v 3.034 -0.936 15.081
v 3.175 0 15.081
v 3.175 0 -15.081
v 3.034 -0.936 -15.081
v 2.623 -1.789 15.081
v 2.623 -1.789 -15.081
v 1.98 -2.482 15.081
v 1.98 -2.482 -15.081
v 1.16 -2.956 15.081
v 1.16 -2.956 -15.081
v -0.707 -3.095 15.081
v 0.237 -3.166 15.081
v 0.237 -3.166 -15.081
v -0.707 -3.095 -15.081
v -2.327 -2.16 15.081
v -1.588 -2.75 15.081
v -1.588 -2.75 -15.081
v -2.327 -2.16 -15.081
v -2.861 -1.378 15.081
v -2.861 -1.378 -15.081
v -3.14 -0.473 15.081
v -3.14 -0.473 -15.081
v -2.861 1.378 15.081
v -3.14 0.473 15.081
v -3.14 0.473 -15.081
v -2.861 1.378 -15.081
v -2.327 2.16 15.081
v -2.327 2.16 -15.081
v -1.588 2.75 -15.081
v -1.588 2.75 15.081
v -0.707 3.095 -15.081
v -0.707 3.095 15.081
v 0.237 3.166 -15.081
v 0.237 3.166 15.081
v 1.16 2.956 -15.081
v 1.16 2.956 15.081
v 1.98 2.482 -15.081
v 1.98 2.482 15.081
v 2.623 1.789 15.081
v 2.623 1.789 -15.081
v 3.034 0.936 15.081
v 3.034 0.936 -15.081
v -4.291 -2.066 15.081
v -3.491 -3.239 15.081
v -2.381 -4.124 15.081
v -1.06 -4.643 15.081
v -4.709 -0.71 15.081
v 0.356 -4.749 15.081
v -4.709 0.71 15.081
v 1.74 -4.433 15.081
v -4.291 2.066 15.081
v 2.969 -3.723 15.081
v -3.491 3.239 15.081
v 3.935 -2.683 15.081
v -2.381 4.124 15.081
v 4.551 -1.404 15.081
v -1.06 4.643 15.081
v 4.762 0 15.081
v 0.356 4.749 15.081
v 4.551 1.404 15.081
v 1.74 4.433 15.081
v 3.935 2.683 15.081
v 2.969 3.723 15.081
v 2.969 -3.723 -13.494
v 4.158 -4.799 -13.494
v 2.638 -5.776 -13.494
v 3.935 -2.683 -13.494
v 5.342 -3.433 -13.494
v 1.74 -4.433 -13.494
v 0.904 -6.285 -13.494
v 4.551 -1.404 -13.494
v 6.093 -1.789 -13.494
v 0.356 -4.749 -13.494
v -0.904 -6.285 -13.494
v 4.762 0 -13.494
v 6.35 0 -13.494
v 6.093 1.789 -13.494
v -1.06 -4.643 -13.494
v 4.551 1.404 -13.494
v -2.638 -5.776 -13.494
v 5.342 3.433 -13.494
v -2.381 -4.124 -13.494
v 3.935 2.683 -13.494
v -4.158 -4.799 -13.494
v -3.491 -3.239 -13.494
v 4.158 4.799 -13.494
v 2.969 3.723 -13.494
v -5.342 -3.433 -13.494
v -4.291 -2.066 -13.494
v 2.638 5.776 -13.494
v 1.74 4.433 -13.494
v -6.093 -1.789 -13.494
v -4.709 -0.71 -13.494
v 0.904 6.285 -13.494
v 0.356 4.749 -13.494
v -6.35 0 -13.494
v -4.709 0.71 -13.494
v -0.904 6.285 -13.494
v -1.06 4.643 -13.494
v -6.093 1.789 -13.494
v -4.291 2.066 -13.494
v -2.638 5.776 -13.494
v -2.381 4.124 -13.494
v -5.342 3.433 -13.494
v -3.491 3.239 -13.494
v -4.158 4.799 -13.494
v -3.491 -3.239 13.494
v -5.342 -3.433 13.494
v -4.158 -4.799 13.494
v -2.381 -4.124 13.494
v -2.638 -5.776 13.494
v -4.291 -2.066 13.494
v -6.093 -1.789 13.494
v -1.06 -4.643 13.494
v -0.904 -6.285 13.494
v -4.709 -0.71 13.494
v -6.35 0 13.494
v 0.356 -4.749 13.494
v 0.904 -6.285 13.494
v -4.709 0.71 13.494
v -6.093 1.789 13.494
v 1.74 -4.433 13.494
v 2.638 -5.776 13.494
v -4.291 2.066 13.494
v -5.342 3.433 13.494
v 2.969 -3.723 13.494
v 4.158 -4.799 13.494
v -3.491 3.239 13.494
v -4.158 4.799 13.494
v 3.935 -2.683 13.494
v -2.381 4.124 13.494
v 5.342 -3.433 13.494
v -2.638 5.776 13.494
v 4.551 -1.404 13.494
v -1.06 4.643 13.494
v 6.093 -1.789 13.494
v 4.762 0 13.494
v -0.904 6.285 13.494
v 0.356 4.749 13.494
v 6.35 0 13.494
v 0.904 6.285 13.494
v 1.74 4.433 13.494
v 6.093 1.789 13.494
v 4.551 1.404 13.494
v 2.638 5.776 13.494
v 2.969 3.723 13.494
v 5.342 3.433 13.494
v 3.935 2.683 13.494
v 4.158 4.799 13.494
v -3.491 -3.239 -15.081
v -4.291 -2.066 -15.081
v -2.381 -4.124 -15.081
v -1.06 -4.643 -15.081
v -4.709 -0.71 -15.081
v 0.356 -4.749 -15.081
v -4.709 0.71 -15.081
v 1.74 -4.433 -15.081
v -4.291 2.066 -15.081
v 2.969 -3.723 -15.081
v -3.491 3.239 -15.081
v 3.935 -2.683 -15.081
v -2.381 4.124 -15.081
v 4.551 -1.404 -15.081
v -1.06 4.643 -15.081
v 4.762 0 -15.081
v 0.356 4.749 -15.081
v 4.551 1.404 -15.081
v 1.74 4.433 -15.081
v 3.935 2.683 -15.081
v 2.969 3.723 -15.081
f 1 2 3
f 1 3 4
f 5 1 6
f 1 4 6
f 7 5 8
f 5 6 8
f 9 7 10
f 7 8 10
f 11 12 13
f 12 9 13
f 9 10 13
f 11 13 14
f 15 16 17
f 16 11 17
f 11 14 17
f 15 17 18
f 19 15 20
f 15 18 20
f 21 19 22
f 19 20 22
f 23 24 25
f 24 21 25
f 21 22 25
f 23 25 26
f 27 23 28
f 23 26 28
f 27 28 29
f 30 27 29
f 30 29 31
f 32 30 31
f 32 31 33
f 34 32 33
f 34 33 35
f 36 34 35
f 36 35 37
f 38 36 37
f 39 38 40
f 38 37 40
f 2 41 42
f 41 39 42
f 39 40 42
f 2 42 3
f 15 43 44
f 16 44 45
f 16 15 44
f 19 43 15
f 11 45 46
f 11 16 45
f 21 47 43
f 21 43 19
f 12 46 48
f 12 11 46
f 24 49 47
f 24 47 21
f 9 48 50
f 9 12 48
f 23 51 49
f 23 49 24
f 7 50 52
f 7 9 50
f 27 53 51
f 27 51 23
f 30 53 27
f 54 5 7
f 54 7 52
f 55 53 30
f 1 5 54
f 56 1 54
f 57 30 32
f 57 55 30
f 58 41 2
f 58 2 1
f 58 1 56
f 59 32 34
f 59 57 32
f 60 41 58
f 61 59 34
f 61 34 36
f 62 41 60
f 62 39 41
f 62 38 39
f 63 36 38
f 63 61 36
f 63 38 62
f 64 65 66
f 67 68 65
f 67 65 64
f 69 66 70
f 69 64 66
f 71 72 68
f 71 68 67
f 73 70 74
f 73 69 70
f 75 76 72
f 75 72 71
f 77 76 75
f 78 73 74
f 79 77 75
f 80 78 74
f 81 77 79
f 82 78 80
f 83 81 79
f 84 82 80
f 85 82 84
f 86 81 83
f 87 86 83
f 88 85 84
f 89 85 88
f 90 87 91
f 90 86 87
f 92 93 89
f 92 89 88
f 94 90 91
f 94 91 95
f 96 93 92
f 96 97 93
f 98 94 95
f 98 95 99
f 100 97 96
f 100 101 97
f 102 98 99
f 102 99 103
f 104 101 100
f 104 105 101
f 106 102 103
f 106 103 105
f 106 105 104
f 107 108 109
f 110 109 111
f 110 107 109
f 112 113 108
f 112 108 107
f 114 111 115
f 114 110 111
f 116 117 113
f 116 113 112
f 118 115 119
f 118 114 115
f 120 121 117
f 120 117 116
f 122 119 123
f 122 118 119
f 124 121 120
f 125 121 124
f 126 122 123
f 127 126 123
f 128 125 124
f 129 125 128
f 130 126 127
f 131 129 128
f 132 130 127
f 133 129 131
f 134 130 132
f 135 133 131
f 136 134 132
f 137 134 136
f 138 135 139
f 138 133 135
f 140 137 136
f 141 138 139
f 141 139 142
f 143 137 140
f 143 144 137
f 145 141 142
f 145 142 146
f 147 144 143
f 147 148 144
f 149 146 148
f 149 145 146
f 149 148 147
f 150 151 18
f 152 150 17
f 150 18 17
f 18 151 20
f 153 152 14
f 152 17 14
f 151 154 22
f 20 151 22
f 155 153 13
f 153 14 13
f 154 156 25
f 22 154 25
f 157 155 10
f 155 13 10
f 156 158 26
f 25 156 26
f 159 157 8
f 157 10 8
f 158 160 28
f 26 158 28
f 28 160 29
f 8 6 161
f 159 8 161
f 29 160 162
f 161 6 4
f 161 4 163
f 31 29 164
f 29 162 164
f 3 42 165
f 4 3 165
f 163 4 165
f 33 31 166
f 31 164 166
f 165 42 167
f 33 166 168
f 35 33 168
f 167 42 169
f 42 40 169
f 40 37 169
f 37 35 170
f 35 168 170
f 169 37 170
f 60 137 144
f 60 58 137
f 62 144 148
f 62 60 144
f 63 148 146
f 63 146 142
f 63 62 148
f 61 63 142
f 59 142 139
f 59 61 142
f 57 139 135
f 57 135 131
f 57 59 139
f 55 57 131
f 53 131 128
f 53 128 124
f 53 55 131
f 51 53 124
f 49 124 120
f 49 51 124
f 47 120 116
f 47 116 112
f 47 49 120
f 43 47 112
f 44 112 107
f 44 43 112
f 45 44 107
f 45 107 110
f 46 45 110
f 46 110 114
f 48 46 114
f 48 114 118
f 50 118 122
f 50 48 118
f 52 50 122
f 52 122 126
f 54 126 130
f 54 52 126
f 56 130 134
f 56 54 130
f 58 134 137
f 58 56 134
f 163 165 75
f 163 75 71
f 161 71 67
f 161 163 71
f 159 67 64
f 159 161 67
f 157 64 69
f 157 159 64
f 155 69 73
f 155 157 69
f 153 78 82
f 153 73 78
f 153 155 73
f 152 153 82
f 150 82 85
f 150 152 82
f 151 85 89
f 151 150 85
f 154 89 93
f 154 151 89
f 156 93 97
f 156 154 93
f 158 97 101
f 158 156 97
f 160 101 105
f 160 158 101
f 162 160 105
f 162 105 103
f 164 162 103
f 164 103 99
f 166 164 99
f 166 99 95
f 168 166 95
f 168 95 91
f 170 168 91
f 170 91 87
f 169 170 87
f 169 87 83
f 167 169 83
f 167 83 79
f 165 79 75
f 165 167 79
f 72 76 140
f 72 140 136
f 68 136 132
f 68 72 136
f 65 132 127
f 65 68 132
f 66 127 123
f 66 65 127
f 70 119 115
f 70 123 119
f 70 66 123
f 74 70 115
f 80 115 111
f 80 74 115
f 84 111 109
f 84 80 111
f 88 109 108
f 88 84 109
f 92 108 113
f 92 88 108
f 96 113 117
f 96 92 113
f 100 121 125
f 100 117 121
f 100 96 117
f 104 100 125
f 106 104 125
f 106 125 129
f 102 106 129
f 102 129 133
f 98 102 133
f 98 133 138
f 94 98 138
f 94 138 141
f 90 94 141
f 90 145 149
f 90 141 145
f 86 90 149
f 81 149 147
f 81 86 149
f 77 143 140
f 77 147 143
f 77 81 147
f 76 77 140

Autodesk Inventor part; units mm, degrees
ref_plane "YZ Plane" through (0, 0, 0) normal (1, 0, 0) x (0, 1, 0)
ref_plane "XZ Plane" through (0, 0, 0) normal (0, 1, 0) x (-1, 0, 0)
ref_plane "XY Plane" through (0, 0, 0) normal (0, 0, 1) x (1, 0, 0)
sketch "Sketch1" plane through (0, 0, 0) normal (0, 0, 1) x (1, 0, 0)
  circle A0 centre (0, 0) radius 6.35
  circle A1 centre (0, 0) radius 3.175
  dimension "d0" = 12.7
  dimension "d13" = 3.175
extrude "Base" add sketch "Sketch1" along normal mid plane 30.1625
sketch "Sketch4" plane through (0, 0, 15.0812) normal (0, 0, 1) x (1, 0, 0)
  circle A0 centre (0, 0) radius 6.35 projected
  circle A1 centre (0, 0) radius 4.7625
  dimension "d16" = 9.525
extrude "Extrusion4" cut sketch "Sketch4" against normal blind 1.5875
mirror "Mirror2" about plane through (0, 0, 0) normal (0, 0, 1) of "Extrusion4"
properties part number "gearbox_standoff" material "Aluminum-6061"
